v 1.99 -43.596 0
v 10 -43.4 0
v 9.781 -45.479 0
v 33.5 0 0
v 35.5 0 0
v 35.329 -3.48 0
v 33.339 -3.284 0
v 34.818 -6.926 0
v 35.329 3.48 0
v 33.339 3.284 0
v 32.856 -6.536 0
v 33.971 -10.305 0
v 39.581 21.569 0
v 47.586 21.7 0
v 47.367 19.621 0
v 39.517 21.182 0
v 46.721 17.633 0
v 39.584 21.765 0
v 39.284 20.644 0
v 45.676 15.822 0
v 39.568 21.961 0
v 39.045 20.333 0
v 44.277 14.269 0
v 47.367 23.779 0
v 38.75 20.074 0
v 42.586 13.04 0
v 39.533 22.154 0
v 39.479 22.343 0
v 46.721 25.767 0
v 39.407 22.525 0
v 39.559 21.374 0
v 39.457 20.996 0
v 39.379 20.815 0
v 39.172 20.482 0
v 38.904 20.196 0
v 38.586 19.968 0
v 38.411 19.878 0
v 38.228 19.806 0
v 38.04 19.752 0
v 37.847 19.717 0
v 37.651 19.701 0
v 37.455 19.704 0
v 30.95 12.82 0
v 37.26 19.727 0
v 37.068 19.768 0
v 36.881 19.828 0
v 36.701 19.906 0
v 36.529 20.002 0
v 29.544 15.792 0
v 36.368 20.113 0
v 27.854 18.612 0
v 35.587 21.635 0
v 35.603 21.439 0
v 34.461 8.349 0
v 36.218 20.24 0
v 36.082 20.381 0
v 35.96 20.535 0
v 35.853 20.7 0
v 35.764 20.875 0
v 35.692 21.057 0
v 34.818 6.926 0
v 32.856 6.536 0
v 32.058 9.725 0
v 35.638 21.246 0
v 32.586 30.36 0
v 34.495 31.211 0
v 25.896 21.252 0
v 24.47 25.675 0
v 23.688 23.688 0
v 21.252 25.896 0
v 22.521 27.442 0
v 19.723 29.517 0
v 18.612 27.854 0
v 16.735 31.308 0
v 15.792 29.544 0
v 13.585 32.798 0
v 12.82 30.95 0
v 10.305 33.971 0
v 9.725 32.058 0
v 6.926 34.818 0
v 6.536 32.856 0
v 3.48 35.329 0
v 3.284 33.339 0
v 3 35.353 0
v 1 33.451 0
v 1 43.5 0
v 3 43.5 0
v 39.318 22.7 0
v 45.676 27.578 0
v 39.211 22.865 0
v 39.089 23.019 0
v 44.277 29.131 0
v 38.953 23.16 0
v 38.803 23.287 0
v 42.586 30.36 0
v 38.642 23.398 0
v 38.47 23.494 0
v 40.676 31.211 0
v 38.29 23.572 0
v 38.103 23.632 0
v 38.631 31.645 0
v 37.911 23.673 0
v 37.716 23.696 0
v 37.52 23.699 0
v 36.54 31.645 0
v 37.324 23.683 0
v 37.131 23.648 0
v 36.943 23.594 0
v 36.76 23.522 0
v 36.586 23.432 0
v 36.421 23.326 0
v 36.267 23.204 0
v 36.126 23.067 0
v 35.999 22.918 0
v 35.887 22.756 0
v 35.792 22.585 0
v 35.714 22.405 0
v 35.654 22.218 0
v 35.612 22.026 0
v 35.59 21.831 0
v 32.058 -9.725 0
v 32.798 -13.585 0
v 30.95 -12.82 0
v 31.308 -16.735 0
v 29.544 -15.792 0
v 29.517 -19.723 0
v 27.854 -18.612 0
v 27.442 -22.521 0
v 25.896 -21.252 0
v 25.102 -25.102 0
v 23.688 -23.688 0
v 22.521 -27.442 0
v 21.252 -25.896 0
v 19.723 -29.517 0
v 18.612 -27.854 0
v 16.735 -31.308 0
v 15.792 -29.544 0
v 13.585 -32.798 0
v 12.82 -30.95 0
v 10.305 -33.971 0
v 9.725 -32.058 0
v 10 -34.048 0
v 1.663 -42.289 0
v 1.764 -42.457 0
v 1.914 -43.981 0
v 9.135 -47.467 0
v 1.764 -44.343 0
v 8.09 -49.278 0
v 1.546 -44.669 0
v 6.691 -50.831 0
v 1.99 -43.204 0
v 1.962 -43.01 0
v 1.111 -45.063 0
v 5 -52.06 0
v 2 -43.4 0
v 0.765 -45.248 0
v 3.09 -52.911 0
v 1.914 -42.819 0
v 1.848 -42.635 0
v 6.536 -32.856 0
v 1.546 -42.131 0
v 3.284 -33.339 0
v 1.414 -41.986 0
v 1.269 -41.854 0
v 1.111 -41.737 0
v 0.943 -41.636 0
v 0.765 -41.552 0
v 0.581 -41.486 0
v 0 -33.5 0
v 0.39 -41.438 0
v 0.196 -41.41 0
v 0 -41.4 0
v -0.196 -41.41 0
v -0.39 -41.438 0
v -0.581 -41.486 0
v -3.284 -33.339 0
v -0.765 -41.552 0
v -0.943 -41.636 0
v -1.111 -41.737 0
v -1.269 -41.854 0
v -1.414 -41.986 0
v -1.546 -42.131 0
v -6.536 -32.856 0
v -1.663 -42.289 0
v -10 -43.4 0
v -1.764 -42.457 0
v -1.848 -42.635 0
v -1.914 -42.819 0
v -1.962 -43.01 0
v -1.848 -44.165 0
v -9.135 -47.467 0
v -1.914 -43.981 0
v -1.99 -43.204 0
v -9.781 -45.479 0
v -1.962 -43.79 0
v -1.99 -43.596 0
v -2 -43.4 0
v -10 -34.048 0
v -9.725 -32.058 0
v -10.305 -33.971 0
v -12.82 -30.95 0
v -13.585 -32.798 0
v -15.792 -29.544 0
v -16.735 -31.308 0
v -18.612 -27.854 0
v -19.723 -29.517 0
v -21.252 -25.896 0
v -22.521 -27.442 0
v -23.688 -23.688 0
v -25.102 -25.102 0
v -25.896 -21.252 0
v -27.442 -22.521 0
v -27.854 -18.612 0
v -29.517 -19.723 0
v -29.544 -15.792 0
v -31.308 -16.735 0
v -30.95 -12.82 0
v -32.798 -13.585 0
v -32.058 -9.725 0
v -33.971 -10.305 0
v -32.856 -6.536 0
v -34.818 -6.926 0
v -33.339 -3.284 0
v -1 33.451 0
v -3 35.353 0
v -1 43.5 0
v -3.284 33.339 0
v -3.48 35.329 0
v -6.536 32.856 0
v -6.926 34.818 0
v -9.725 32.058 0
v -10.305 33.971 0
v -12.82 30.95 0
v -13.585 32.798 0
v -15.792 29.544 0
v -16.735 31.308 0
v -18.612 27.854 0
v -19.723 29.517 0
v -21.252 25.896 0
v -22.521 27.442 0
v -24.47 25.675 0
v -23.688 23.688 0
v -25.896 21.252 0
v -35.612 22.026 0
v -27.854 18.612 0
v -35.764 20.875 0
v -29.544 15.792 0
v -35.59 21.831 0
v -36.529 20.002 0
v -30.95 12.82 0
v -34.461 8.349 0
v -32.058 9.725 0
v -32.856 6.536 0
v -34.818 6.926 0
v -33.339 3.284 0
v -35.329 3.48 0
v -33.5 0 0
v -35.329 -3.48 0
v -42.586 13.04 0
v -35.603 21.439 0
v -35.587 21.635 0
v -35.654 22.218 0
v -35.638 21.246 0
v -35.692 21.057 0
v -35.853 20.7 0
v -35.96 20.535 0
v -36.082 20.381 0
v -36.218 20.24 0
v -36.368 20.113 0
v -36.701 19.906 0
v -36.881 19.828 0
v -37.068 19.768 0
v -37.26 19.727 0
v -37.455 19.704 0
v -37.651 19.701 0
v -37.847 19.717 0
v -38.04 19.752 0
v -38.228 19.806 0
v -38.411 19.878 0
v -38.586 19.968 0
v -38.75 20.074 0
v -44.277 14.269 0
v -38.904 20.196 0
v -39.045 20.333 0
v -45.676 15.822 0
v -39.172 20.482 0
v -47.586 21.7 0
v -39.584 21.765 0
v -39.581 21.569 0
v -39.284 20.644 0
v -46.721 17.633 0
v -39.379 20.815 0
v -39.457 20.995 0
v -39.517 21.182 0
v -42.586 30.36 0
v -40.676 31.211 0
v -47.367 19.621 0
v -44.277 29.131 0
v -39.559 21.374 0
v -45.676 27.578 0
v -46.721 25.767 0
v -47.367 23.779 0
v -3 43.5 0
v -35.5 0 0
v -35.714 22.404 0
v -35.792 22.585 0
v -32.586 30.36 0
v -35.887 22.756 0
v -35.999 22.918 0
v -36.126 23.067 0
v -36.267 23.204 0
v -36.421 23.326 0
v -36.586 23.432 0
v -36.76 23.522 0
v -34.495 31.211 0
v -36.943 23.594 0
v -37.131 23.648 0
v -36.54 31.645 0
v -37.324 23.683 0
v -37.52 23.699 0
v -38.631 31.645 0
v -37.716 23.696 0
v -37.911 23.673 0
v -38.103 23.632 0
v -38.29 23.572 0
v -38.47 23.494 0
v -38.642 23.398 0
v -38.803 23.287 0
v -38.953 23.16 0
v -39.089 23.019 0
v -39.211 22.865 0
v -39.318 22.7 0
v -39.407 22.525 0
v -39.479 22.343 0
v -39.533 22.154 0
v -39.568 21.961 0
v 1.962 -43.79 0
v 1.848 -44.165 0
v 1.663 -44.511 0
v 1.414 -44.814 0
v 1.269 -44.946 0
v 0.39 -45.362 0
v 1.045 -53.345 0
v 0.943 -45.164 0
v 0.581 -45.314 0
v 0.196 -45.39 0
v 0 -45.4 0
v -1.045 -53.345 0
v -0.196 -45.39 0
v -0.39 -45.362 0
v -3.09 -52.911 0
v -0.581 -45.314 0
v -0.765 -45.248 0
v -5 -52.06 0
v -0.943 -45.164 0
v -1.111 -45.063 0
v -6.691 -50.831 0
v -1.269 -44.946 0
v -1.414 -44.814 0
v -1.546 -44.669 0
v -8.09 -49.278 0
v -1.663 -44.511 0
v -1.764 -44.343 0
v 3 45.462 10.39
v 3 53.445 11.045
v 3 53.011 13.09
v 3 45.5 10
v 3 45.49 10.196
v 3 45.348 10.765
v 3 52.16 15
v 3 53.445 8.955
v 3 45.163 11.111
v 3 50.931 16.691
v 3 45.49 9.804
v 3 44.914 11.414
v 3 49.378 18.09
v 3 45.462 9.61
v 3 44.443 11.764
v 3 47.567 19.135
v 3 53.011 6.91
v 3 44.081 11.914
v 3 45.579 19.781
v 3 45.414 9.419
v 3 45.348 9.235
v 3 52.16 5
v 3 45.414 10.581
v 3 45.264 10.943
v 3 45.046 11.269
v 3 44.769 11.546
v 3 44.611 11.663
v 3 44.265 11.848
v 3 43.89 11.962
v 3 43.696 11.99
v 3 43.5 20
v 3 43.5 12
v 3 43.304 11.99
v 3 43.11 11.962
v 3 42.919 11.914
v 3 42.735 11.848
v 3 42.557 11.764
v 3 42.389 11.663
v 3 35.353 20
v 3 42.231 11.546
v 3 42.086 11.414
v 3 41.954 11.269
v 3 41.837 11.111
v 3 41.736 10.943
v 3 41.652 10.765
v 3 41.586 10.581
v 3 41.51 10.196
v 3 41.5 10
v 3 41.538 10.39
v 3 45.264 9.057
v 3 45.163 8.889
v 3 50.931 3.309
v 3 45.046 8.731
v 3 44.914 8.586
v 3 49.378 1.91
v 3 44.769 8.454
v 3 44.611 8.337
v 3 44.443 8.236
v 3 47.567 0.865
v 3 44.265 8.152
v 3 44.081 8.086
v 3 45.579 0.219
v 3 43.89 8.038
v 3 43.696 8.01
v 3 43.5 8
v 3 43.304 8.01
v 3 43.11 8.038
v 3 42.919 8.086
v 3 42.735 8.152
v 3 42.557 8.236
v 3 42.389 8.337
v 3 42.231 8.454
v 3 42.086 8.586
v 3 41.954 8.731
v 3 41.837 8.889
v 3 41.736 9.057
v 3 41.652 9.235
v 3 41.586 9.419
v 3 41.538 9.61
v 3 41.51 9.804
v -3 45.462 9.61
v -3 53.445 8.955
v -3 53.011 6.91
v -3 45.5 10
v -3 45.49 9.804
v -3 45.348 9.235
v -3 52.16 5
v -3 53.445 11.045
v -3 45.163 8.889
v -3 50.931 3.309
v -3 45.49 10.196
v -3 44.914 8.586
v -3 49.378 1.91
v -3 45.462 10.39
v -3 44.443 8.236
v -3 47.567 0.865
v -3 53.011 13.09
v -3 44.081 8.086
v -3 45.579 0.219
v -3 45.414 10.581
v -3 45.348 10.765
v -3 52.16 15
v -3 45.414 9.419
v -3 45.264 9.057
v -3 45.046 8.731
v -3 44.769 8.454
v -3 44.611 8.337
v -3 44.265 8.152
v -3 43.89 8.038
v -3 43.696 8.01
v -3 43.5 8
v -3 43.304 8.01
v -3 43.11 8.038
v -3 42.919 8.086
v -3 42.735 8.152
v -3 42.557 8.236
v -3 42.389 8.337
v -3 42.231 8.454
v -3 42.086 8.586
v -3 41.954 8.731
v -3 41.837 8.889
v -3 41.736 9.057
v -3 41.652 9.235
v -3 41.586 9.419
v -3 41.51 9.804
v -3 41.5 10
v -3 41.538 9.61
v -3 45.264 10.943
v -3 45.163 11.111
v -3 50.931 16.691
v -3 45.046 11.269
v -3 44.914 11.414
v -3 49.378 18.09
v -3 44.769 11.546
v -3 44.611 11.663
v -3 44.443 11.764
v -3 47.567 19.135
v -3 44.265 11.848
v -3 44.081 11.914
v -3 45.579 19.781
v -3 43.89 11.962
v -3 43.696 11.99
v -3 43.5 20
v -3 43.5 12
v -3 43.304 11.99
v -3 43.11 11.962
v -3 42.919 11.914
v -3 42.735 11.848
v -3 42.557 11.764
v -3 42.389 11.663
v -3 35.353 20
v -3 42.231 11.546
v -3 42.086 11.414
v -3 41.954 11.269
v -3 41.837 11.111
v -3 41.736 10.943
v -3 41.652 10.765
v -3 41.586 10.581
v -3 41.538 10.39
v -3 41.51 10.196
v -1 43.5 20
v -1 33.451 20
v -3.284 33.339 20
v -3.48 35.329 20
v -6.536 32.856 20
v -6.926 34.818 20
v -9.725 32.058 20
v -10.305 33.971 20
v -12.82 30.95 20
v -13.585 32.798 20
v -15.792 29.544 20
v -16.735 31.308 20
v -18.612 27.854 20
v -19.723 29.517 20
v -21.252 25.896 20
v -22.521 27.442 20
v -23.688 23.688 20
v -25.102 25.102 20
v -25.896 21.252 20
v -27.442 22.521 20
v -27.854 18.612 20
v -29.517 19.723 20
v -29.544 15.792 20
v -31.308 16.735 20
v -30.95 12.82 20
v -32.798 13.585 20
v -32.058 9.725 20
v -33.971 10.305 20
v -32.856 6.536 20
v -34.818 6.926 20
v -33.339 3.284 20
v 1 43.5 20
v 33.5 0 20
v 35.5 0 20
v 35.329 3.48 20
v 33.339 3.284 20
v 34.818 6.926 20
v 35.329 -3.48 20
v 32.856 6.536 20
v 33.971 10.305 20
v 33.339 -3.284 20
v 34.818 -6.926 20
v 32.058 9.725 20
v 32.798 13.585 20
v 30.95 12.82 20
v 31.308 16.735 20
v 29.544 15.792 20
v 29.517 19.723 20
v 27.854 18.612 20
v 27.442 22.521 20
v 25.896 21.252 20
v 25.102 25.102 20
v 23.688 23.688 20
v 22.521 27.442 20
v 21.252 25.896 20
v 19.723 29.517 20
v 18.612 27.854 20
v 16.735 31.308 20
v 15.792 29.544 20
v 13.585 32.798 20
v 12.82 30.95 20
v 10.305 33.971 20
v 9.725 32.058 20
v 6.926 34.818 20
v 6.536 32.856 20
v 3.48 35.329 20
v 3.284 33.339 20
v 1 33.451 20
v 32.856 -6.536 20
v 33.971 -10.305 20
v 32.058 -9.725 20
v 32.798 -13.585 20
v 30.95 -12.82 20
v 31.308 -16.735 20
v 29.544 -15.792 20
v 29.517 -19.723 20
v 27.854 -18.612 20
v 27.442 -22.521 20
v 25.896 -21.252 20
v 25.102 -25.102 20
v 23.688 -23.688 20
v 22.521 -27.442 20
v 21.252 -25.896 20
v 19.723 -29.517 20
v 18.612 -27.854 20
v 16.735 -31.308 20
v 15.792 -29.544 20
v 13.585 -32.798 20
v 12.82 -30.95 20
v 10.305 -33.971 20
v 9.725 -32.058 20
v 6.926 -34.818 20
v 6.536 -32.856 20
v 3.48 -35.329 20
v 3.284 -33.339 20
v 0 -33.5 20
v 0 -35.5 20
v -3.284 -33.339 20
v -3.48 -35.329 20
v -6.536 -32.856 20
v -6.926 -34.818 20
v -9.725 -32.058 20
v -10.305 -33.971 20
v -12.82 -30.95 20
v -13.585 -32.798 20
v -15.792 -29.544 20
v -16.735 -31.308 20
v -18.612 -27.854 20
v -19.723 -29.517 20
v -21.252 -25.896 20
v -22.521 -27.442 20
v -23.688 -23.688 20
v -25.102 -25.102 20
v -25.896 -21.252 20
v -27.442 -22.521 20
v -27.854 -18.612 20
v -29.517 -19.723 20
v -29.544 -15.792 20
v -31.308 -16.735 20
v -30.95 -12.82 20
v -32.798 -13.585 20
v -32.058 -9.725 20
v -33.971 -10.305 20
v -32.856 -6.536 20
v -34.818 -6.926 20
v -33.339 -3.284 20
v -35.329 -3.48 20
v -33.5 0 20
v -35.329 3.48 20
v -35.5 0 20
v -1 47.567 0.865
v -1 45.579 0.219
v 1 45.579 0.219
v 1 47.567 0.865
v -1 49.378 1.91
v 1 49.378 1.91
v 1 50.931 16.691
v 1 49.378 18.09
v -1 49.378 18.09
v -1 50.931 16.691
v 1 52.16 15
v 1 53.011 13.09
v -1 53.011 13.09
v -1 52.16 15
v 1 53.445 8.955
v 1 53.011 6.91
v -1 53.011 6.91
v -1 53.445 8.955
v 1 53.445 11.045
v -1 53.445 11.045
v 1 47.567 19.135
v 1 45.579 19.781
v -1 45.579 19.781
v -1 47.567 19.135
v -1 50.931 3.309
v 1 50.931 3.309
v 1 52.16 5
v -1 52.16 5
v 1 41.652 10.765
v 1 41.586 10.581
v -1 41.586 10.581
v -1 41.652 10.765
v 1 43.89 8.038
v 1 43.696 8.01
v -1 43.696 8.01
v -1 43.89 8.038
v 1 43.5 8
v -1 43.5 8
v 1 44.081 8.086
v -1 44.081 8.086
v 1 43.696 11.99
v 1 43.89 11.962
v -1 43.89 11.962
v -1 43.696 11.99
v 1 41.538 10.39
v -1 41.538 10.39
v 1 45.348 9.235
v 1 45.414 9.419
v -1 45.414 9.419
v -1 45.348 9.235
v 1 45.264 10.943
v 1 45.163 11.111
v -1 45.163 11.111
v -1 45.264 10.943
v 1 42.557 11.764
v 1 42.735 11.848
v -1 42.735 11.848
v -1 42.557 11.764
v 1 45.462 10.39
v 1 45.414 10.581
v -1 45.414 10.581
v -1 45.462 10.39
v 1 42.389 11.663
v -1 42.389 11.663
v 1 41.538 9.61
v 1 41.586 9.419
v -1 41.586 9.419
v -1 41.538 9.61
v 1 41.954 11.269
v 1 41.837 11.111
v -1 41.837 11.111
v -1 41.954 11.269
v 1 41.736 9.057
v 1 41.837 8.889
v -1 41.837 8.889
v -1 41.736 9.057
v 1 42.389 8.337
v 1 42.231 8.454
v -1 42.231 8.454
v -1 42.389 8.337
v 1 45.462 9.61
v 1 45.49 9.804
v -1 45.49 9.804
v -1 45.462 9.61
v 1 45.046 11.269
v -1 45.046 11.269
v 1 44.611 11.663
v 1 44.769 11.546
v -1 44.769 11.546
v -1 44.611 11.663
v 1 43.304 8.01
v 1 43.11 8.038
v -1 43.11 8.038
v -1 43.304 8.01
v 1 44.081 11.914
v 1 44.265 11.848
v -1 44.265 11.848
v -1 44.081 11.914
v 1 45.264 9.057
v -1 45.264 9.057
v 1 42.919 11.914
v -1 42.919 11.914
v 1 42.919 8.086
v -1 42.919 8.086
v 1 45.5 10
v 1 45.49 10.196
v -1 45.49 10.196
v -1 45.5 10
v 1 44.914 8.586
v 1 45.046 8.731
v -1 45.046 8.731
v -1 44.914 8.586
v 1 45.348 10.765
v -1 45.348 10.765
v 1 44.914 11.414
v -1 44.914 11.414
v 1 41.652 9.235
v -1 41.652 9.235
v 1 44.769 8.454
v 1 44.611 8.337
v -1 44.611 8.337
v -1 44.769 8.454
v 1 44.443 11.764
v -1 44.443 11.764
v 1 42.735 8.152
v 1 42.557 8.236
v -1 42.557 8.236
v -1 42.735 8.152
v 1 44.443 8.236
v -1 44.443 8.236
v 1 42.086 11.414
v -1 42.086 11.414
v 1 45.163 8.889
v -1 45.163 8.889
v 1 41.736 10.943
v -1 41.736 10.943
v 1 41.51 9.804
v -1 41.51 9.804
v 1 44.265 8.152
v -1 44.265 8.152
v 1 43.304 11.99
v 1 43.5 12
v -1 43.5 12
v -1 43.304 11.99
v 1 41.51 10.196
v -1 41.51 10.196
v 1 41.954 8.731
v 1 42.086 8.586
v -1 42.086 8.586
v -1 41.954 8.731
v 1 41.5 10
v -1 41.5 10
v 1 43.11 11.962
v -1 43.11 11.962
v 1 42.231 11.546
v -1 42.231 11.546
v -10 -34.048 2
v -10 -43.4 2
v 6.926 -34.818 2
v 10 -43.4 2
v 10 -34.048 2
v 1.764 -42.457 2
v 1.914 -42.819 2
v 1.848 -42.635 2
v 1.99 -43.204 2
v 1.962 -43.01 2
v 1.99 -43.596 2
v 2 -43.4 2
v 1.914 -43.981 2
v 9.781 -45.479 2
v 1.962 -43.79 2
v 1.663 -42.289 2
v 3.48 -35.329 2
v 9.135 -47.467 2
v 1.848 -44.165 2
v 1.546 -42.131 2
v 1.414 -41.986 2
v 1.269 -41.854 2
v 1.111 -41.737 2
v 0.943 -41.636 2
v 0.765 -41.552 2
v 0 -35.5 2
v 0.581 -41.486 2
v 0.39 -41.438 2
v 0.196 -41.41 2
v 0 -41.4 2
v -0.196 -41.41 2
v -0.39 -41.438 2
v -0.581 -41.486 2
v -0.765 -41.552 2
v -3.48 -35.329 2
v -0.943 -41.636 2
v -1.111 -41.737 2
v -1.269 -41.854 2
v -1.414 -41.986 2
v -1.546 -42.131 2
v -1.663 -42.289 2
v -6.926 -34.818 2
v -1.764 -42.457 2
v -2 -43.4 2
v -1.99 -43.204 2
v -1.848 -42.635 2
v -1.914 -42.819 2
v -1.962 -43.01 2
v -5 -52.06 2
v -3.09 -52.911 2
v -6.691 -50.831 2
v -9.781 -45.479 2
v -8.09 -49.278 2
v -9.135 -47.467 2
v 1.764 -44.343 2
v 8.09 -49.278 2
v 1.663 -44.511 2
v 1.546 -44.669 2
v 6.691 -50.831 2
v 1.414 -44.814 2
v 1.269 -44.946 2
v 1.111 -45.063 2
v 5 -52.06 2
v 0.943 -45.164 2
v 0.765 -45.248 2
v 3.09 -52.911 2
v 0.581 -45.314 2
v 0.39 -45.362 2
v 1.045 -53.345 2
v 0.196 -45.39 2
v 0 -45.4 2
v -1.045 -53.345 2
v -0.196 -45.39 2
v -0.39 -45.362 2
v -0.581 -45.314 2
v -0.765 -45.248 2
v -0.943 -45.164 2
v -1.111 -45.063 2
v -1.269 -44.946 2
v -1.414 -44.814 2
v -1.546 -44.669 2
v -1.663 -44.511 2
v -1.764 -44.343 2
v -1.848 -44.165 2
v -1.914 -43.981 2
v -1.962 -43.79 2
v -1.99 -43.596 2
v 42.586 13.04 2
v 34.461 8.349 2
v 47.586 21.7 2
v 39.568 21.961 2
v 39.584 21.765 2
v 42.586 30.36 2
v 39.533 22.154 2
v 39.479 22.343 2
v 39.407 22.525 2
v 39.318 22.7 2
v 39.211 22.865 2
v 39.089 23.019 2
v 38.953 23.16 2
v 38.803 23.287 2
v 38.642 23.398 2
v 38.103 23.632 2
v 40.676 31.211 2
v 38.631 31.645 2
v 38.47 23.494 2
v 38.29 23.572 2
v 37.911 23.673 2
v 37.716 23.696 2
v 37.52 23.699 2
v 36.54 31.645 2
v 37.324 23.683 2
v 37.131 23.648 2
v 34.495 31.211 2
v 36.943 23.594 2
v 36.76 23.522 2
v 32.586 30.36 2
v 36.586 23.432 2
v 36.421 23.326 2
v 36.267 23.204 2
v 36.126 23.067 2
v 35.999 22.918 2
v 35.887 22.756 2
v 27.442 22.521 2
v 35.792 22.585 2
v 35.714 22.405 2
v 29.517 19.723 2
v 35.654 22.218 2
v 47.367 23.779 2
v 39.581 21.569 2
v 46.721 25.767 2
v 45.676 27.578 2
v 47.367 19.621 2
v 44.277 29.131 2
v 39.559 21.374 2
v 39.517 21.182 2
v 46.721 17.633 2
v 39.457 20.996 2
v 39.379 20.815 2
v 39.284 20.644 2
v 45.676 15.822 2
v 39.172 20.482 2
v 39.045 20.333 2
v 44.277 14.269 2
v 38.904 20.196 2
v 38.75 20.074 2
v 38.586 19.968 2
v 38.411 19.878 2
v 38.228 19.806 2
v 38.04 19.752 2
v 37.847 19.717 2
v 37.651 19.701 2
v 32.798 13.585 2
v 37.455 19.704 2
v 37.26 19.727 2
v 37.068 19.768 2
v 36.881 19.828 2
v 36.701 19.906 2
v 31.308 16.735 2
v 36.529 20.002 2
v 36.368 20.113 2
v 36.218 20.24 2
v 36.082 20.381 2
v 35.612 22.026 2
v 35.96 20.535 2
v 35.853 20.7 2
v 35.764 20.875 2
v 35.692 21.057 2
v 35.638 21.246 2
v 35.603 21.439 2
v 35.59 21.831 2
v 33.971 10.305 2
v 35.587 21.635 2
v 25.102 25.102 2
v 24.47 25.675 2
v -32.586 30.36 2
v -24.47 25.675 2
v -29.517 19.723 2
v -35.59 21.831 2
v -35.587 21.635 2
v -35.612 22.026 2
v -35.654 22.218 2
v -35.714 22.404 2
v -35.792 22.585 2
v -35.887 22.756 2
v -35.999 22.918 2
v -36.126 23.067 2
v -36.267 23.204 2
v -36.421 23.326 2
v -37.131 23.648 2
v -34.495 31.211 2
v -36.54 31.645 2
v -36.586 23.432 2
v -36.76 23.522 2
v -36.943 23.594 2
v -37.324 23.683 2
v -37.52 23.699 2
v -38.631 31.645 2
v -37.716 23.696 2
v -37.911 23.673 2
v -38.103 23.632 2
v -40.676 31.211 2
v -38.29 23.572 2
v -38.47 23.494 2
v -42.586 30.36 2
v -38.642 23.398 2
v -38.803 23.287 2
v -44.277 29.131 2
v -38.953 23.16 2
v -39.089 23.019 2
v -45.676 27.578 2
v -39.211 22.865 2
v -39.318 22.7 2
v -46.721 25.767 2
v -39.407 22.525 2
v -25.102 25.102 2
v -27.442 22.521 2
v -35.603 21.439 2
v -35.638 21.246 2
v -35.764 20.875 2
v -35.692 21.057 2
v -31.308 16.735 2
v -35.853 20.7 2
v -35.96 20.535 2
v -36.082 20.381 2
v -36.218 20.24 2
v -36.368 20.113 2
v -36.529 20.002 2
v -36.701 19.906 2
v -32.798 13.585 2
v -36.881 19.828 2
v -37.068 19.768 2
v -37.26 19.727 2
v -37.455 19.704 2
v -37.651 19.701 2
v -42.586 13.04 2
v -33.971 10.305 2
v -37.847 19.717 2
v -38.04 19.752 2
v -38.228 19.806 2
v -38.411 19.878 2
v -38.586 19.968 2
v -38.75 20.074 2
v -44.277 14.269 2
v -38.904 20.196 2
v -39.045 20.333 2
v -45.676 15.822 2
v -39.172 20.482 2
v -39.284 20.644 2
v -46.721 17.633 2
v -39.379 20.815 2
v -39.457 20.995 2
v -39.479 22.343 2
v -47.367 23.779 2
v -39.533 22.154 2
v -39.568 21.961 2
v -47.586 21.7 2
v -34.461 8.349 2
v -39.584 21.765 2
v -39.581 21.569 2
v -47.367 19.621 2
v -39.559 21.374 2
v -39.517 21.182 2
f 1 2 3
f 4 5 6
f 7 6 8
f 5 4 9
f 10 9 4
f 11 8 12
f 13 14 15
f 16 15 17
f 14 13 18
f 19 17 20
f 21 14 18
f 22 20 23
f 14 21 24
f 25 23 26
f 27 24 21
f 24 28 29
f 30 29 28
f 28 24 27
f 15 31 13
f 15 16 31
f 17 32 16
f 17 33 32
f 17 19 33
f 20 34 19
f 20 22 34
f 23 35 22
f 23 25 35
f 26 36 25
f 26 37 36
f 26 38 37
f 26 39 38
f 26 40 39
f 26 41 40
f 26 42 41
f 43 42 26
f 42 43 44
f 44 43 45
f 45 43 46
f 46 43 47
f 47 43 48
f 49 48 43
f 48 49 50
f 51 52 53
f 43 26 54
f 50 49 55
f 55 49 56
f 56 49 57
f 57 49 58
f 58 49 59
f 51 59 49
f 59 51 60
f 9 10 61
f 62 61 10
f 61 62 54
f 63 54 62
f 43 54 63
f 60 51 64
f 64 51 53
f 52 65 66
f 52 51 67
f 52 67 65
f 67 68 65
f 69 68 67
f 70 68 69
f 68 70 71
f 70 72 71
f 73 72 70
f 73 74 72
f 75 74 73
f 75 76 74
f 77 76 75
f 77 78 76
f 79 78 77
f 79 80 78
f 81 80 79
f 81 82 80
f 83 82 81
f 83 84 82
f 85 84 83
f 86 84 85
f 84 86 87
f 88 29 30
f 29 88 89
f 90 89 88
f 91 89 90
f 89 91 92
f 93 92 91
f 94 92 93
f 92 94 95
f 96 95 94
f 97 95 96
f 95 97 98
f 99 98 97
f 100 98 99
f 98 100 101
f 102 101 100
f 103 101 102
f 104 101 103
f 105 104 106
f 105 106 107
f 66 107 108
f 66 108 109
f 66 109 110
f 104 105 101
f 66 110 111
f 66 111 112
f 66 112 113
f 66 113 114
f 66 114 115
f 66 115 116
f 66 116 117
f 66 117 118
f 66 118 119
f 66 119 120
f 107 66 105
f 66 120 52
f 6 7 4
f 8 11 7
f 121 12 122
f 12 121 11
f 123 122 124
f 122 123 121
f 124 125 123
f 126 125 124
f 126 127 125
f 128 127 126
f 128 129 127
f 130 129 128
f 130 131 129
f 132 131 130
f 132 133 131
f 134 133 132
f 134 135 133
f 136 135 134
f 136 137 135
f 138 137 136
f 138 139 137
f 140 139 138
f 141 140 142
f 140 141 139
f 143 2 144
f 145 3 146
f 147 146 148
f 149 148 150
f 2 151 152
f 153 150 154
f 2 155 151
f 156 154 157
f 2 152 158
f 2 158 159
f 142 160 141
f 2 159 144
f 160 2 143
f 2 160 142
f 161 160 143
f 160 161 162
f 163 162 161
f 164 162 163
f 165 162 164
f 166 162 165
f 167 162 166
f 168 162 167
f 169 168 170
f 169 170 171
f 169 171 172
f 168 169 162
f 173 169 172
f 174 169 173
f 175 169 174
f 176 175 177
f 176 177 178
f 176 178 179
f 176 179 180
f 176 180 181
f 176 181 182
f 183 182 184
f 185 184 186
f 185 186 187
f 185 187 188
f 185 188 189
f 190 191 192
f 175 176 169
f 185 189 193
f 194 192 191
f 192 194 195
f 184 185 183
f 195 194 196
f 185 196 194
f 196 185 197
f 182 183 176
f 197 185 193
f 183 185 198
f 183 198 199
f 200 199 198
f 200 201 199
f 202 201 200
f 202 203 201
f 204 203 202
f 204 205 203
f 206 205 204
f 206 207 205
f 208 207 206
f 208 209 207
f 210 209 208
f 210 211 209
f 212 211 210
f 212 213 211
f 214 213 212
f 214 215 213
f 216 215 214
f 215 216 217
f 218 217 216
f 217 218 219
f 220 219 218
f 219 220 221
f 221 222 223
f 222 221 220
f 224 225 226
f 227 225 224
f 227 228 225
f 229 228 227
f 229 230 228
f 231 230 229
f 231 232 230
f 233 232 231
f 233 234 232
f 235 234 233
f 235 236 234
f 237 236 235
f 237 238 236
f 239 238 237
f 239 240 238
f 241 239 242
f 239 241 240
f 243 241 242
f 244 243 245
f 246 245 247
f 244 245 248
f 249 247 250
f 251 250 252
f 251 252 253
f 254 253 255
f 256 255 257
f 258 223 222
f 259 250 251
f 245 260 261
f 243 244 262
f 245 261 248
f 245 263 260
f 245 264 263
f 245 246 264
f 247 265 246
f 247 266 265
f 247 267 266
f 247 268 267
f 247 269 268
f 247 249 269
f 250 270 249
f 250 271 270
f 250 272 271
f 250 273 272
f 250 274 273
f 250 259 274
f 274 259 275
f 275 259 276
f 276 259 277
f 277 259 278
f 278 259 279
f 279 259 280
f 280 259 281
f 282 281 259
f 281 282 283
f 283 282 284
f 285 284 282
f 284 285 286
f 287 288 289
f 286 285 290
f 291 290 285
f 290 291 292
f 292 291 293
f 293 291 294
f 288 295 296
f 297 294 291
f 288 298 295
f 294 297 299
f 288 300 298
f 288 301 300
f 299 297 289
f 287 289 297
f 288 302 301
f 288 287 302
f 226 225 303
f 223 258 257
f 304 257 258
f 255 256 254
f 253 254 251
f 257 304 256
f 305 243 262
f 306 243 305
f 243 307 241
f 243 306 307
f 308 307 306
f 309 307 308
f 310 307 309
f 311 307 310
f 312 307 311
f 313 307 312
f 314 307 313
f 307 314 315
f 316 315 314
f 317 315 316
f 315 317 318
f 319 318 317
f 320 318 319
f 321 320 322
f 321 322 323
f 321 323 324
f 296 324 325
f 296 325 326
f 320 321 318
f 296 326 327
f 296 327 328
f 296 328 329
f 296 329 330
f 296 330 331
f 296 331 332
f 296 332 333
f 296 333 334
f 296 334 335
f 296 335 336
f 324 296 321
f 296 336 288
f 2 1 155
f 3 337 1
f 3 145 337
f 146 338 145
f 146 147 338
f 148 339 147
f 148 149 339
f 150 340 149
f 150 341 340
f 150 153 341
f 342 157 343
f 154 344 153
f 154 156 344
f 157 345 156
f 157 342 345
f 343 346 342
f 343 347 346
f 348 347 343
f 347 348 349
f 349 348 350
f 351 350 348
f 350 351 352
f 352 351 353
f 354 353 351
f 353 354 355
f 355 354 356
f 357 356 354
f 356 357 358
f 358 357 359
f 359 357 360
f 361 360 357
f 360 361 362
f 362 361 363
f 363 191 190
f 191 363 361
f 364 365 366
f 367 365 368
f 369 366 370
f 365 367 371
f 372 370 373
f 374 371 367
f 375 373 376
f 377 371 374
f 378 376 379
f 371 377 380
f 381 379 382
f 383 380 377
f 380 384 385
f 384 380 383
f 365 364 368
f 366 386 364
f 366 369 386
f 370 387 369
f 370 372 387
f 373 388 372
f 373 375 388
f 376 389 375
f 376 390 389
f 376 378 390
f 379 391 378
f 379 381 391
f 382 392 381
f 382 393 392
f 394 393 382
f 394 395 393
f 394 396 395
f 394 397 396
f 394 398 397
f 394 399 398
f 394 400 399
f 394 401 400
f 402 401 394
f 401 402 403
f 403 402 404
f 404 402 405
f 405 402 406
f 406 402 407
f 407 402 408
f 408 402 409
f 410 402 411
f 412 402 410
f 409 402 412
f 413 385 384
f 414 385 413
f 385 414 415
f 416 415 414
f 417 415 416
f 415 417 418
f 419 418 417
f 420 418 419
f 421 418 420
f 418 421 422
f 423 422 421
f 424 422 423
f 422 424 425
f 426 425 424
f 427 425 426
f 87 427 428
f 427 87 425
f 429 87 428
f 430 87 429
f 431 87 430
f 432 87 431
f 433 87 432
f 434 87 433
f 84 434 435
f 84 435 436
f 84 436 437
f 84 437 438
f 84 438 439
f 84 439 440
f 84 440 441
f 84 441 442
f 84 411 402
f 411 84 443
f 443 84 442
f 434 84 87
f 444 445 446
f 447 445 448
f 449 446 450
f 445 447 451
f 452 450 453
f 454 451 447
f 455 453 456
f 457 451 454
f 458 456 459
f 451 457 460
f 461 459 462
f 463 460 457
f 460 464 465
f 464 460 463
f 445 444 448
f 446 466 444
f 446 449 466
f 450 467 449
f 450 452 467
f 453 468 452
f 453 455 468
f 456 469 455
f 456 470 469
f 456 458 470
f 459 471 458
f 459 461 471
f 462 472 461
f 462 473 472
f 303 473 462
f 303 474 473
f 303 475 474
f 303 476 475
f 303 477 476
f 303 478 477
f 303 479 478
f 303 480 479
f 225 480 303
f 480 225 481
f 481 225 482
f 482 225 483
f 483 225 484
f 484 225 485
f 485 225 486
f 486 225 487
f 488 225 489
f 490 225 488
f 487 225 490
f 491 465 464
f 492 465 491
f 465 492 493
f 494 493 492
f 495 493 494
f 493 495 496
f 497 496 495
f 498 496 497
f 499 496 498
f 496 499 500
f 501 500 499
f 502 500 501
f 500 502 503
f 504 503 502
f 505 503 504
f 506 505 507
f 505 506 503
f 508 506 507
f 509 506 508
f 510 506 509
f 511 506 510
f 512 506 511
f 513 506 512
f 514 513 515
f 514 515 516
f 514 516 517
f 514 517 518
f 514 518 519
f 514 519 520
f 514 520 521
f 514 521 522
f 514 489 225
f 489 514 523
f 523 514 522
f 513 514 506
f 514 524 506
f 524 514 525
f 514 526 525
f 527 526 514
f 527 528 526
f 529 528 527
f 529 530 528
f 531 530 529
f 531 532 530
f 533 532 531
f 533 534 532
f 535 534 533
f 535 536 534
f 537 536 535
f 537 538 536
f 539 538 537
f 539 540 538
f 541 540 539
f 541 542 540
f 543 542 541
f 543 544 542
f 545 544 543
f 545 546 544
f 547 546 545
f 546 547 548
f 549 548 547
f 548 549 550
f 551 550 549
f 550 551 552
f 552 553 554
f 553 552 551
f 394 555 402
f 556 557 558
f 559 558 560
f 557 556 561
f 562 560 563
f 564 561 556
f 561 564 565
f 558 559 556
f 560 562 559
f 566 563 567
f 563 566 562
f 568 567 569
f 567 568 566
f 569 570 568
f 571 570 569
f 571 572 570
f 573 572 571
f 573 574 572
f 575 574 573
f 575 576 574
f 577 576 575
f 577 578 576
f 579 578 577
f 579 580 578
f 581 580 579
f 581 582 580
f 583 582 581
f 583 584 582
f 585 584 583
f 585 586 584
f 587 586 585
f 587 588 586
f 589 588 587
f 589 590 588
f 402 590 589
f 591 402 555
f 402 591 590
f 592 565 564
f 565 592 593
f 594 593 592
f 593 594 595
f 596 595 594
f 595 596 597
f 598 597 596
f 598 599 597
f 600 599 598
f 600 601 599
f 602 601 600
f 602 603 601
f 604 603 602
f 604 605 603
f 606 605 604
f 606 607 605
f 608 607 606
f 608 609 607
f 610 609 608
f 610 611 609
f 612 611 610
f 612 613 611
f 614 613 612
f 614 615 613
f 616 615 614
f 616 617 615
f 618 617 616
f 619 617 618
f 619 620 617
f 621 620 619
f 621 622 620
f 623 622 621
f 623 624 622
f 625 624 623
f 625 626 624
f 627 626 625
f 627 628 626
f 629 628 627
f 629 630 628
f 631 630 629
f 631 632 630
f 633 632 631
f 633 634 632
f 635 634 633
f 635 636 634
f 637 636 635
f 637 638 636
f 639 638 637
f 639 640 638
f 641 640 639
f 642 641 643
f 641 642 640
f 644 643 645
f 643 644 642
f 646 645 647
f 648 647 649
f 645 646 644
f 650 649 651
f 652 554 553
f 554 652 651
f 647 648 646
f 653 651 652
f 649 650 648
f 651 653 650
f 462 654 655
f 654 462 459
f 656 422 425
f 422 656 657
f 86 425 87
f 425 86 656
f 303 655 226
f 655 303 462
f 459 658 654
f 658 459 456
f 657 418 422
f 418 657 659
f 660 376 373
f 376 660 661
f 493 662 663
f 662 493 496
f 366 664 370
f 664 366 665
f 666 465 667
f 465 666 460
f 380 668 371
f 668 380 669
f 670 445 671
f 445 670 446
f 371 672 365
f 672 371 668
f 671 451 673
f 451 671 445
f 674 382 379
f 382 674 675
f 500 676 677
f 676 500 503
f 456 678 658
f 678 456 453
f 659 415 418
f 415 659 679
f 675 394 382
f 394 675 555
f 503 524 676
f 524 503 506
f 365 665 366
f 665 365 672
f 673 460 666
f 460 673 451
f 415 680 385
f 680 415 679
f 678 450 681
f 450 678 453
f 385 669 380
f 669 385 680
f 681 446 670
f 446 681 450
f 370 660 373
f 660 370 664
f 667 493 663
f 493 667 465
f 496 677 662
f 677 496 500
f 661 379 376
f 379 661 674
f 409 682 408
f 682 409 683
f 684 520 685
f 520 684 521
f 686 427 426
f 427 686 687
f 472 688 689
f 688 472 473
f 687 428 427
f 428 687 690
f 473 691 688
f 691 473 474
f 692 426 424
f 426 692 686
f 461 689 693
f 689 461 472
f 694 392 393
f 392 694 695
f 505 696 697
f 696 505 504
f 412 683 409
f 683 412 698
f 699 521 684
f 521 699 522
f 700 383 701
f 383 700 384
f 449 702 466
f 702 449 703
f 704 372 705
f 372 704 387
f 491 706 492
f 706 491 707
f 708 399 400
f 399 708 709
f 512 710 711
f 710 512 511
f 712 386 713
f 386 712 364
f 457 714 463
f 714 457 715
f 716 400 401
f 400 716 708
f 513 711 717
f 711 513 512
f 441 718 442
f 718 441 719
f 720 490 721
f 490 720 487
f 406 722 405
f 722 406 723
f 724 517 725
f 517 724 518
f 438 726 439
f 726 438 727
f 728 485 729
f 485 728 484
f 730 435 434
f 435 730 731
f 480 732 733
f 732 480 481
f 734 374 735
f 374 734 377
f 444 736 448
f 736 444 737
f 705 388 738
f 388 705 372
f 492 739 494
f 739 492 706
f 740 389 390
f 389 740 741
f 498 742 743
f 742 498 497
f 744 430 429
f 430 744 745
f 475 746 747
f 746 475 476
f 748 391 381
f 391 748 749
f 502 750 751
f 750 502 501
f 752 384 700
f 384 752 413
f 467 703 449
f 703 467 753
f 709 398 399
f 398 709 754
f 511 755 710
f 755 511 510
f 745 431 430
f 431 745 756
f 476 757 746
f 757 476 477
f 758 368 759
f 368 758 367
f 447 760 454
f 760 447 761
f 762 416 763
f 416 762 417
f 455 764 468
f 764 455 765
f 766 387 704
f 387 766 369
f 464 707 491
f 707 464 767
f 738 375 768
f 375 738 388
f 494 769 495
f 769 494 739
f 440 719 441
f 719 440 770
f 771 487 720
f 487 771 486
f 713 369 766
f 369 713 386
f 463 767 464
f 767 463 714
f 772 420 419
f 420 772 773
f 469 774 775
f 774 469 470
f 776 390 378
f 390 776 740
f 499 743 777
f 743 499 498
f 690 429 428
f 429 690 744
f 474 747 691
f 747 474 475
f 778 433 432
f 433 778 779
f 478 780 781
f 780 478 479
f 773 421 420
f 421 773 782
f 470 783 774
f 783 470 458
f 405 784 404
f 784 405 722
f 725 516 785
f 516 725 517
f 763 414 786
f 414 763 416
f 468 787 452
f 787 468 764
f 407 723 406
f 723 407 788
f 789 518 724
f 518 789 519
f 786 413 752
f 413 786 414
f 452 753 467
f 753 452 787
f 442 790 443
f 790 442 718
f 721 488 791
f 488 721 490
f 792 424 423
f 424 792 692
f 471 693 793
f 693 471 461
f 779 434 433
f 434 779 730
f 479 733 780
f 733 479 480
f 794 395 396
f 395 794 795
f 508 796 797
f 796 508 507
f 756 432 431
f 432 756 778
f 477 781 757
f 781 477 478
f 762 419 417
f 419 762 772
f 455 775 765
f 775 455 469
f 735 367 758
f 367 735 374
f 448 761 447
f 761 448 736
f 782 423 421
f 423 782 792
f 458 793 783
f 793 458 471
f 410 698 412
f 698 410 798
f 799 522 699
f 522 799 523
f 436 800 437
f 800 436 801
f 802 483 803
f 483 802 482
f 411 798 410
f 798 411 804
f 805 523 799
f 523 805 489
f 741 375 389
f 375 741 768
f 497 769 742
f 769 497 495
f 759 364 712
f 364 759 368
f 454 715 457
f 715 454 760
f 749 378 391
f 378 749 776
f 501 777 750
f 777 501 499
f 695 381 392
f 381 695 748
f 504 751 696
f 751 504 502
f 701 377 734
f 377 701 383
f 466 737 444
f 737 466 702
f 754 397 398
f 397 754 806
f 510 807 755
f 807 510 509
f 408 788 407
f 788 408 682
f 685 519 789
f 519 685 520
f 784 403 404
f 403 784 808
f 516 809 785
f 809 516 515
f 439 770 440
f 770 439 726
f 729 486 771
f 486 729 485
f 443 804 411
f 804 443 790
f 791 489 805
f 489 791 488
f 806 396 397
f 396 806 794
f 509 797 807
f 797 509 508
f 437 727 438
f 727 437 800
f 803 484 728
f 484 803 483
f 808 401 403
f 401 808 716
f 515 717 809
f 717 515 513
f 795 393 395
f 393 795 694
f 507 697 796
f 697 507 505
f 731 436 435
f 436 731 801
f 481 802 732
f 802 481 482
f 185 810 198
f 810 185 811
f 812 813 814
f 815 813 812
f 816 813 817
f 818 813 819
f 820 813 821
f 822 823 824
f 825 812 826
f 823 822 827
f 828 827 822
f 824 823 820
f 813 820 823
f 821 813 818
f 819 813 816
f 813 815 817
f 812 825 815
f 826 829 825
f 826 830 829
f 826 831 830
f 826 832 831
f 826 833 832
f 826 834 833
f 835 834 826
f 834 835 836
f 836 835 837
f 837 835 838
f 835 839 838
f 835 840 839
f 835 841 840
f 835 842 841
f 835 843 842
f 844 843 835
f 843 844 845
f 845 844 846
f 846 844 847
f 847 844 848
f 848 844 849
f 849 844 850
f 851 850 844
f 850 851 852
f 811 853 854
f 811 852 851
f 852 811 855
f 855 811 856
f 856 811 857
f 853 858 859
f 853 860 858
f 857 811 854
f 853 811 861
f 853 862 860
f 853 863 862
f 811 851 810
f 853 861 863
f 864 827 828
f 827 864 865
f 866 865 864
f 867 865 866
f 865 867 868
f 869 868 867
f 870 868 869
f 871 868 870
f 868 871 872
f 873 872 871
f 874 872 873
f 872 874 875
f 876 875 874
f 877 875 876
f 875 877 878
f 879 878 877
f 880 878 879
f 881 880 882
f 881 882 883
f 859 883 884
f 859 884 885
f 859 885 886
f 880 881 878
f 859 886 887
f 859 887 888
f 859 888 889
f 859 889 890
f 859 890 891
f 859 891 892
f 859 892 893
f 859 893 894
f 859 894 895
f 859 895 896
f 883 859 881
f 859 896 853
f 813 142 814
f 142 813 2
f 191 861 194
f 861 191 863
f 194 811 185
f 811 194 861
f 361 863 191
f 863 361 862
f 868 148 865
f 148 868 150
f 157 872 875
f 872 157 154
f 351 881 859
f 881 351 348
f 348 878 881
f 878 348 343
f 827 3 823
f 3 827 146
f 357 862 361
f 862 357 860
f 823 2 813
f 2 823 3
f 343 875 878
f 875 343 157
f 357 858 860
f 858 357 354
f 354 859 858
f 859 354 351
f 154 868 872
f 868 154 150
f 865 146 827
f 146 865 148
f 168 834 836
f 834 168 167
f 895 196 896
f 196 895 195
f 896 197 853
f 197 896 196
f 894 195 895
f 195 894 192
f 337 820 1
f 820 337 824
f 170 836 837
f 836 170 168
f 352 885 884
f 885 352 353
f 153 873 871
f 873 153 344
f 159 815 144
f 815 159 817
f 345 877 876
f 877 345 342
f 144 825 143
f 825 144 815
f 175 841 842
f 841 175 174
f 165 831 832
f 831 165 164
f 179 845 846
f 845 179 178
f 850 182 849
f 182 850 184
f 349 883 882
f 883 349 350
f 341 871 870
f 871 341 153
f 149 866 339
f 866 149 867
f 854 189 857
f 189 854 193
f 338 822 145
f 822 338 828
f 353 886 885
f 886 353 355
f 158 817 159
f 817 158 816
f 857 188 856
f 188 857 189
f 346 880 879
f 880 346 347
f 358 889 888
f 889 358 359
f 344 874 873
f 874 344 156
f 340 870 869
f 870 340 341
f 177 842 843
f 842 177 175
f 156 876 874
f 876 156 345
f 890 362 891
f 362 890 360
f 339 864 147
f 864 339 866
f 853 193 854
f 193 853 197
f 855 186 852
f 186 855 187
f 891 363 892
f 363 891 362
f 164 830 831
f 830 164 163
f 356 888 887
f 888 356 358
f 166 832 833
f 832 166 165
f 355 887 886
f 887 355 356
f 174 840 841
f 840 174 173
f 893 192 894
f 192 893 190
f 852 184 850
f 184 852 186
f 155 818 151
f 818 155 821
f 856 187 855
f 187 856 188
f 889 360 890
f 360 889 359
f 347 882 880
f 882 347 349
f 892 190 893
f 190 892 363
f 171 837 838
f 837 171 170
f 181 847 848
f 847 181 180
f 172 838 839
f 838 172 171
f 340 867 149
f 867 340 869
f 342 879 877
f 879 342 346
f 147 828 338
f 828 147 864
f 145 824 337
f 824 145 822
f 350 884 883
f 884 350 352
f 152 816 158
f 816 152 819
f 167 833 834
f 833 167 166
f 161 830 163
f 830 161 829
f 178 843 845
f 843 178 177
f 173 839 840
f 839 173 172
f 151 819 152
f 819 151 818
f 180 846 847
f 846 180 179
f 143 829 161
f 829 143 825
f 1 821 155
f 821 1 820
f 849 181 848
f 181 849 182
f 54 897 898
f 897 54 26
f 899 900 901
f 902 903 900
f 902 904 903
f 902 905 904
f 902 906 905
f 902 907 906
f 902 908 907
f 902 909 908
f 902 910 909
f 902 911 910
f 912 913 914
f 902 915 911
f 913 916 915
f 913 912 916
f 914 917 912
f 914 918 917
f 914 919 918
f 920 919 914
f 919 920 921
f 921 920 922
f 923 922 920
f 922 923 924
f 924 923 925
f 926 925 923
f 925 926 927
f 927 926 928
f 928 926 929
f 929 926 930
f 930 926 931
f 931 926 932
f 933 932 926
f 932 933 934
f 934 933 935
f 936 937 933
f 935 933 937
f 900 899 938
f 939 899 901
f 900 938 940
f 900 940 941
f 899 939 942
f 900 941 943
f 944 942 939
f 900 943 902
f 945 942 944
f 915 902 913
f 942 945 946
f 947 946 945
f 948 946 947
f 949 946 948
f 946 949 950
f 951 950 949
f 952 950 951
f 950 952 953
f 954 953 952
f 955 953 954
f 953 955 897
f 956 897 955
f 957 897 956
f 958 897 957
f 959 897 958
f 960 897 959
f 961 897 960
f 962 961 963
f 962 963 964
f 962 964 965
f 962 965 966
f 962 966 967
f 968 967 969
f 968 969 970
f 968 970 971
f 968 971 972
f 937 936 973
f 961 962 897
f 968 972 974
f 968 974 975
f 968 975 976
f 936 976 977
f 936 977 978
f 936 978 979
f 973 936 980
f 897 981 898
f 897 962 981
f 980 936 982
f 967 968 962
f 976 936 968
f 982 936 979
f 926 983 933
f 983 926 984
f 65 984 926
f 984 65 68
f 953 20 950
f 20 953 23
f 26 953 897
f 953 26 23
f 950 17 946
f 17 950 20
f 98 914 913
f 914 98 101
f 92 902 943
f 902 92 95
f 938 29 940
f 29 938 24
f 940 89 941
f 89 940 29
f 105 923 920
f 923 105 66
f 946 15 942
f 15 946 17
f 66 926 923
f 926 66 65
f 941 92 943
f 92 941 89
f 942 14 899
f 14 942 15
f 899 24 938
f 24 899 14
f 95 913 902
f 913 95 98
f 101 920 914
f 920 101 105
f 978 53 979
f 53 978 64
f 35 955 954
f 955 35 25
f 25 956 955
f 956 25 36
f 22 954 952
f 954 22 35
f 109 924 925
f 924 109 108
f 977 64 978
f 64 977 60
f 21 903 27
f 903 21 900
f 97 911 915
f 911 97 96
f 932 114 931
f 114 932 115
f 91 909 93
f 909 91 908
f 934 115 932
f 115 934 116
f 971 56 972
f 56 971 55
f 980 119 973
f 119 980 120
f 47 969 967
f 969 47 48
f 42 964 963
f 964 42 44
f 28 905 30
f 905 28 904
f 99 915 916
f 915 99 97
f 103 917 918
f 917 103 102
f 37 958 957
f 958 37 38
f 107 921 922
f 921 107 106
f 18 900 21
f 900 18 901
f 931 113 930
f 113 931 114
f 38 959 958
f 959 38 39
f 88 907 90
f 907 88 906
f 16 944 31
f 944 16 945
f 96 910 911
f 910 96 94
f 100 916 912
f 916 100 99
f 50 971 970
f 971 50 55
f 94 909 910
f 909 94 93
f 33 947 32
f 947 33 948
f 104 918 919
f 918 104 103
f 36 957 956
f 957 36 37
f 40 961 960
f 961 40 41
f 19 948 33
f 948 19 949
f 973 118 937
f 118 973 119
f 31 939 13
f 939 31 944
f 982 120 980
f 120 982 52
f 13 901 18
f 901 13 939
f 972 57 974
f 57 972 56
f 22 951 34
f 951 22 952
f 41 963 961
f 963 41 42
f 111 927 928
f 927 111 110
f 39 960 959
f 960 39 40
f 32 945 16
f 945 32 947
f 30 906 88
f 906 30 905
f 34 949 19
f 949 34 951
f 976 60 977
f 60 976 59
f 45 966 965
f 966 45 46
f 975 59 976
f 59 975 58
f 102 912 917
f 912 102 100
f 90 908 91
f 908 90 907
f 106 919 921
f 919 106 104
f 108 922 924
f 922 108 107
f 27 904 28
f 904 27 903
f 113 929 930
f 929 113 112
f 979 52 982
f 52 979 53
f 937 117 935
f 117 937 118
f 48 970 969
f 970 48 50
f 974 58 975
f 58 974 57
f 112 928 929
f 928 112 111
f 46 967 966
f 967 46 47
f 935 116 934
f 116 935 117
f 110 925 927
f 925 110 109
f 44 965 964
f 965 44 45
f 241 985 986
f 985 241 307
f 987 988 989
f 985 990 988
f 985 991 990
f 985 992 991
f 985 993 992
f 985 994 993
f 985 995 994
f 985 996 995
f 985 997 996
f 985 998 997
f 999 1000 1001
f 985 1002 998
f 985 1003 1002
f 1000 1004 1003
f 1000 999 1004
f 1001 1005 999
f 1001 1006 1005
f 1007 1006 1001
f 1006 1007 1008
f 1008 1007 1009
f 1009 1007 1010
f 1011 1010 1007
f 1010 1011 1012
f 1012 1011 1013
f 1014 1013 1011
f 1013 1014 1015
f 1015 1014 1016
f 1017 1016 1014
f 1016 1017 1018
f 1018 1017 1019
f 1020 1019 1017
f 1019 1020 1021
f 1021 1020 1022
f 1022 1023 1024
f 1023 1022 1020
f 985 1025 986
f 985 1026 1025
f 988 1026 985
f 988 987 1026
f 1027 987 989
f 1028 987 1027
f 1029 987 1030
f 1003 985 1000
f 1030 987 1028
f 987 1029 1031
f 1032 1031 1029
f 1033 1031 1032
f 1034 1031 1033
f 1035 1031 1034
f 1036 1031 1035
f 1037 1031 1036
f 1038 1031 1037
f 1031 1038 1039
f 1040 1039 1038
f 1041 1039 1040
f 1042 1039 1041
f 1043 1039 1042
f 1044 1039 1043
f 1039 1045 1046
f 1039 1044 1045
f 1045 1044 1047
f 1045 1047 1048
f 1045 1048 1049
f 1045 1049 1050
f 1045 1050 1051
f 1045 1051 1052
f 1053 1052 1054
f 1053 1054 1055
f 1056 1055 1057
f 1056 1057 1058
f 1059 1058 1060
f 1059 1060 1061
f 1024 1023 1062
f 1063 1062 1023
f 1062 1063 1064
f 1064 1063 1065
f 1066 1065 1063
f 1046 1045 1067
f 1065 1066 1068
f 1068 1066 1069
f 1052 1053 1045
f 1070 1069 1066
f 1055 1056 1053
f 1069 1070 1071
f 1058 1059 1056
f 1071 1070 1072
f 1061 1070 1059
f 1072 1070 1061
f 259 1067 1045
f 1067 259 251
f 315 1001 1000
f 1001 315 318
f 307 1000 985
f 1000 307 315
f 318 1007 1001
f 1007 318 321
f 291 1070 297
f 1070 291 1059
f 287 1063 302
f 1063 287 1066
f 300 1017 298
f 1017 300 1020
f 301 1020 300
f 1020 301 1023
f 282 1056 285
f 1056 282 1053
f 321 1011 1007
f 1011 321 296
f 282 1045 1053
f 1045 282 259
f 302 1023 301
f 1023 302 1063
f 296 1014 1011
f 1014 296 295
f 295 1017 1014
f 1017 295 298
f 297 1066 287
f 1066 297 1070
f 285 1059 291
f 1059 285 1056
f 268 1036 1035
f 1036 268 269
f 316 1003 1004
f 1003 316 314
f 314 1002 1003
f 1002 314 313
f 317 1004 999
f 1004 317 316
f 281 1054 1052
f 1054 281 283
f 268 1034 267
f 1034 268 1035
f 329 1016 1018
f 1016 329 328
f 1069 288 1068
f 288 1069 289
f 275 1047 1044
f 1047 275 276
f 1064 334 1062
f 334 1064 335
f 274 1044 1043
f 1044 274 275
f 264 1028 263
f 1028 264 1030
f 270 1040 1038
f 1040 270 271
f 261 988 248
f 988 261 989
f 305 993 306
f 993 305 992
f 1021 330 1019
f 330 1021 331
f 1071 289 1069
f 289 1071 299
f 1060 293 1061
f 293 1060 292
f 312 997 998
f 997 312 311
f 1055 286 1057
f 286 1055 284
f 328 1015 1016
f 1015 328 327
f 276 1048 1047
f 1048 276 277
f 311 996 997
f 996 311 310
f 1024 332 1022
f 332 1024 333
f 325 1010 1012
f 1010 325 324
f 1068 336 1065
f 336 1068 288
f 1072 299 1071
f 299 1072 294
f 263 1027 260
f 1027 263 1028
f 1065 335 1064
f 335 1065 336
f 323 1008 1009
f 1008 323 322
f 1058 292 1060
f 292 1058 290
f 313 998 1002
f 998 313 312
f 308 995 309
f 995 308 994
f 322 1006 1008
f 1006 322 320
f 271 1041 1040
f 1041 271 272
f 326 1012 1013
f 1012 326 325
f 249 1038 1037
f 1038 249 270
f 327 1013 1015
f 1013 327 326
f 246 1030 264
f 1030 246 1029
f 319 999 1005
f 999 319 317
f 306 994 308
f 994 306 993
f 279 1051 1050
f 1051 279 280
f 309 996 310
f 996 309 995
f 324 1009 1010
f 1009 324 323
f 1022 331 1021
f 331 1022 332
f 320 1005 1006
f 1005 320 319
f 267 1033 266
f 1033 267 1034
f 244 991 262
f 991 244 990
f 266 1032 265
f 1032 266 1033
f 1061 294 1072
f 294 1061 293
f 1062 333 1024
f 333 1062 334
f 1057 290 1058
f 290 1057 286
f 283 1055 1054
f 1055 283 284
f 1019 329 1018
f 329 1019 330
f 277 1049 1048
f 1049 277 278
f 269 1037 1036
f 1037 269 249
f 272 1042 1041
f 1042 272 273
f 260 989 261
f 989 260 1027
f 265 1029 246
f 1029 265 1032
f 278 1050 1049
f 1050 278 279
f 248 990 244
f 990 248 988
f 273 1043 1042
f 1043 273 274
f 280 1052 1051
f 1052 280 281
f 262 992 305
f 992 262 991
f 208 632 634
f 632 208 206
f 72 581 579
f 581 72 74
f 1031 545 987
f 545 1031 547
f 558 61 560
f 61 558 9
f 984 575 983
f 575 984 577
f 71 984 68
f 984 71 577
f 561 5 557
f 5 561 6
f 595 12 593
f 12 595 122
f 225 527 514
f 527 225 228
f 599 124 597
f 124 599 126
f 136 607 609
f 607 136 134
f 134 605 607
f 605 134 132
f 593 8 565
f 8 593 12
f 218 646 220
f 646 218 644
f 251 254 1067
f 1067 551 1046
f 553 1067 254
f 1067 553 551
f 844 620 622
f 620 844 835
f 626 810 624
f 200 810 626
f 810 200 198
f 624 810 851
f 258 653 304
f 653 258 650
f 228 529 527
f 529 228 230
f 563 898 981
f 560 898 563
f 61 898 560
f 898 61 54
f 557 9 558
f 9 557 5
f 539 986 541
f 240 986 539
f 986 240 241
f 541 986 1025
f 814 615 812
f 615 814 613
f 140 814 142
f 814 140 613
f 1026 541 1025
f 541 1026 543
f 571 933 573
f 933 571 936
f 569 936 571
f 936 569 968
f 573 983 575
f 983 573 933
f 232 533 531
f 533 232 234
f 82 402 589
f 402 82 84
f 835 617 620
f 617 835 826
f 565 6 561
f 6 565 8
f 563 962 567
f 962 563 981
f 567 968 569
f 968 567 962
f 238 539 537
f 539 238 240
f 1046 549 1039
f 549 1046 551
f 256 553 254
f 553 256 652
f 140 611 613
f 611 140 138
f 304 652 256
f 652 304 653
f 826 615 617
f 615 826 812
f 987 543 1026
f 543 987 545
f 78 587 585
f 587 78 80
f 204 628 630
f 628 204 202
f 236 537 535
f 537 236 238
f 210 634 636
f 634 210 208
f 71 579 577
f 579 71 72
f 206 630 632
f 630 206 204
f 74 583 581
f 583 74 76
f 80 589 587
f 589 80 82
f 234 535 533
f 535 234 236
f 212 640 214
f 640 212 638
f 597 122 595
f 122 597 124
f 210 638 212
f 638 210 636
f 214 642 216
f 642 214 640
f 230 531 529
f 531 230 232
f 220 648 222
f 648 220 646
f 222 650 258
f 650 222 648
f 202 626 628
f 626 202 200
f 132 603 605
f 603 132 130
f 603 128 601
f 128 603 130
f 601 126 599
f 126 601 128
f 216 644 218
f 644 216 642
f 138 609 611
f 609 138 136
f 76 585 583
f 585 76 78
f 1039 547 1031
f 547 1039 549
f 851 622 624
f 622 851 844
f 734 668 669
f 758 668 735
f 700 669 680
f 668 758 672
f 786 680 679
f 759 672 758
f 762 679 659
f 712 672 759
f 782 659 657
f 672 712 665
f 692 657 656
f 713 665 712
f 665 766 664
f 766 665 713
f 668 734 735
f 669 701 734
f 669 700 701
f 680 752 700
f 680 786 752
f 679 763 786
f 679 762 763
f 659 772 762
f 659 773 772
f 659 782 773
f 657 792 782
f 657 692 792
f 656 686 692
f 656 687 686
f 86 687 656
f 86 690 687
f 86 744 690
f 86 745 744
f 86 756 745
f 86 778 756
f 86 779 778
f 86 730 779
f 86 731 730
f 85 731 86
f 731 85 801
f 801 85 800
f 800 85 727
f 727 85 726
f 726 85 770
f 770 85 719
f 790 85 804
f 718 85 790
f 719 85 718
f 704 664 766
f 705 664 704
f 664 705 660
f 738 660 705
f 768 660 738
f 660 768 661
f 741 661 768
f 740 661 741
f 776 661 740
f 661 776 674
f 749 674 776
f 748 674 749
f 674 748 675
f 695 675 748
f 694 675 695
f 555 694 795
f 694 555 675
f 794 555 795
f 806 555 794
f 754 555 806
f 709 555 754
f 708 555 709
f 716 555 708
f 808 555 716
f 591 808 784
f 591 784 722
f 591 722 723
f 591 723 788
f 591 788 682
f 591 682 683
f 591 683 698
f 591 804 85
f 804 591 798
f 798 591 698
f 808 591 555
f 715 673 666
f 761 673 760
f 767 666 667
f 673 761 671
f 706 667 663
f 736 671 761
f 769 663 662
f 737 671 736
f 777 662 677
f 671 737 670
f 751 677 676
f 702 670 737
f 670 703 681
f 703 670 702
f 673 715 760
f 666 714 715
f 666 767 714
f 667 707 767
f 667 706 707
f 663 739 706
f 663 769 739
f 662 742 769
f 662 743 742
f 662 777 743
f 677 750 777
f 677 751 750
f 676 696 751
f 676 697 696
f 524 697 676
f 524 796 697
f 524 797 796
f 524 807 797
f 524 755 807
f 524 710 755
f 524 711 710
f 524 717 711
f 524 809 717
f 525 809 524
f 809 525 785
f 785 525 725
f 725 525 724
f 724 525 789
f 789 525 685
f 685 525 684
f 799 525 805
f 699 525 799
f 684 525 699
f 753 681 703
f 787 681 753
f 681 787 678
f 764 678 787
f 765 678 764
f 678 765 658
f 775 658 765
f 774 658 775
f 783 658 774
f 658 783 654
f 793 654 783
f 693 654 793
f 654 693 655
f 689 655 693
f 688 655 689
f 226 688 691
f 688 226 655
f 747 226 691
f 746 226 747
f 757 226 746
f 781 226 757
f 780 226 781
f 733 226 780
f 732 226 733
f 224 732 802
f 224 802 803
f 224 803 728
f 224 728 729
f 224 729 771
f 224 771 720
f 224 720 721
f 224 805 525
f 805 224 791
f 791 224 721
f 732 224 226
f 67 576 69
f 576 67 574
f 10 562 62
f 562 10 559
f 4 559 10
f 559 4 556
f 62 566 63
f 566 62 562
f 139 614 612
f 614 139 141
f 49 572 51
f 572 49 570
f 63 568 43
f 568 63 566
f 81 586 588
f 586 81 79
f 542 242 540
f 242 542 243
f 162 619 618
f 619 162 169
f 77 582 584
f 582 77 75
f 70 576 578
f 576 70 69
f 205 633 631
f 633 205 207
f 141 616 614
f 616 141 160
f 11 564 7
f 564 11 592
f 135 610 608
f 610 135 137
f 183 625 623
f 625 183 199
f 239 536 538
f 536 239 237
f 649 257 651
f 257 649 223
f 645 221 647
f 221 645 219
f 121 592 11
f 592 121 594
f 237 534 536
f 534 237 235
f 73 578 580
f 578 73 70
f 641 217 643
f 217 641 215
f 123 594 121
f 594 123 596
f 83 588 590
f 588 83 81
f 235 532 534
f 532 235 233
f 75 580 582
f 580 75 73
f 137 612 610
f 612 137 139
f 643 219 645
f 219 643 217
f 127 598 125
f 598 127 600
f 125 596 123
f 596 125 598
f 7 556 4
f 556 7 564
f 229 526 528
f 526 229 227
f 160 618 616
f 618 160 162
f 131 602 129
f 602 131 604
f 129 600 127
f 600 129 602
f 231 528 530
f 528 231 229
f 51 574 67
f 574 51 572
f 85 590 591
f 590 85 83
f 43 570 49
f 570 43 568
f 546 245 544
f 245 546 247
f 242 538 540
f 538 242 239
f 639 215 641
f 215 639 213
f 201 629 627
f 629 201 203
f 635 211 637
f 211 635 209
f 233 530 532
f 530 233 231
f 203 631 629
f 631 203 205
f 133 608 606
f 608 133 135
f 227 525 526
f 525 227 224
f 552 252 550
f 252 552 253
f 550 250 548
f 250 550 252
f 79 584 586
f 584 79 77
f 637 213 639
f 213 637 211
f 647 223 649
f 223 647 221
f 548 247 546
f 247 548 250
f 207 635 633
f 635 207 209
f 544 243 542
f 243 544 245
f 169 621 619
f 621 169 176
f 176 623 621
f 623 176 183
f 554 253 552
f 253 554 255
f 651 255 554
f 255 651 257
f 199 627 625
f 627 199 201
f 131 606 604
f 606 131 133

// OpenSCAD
// make this the same as your capacitors diameter
innerDiameter = 67;

// configure the belt
beltHeight = 20;
beltThickness = 2;

// configure the latch
totalLatchThickness = 3 * beltThickness;

// configure feet
numOfFeet = 3;
feetAngleOffset = 0;

// diameter for screw holes in feet
screwHoleDiameter = 4;

// number of segments for cylinders
globalFn = 64;

difference() {
    union() {
        // outer body
        beltOuter();

        // latch to clamp capacitor
        beltLatch(totalLatchThickness, beltHeight);

        // add feet
        feet();
    }

    // remove inside space for capacitor
    beltInner();

    // subtract a larger version of the latch
    // to split the latch block and belt into two pieces
    translate([0, -3, -3]) beltLatch(beltThickness, beltHeight + 6);
}

module beltOuter() {
    // outer diameter
    cylinder(d=innerDiameter + 2*beltThickness, h=beltHeight, $fn=globalFn);
}

module beltInner() {
    // subtract inside diameter
    cylinder(d=innerDiameter, h=beltHeight, $fn=globalFn);
}

module beltLatch(thickness, size) {
    // latch to clamp capacitor
    translate([0, innerDiameter/2 + size/2, size/2]) {
        rotate([0, 90, 0]) {
            latch(thickness, size);
        }
    }
}

module feet() {
    for (i = [1:numOfFeet]) {
        angle = i * 360/numOfFeet + 60 + feetAngleOffset;
        foot(angle);
    }
}

module foot(angle) {
    rotate([0, 0, angle]) {
        translate([0, innerDiameter/2 + beltHeight/2 - 0.1, beltThickness/2]) {
            latch(beltThickness, beltHeight);
        }
    }
}

module latch(thickness, size) {
    translate([-size/2, -size/2, -thickness/2]) {
        difference() {
            // latch body
            union() {
                cube([size, size/2, thickness]);
                translate([size/2, size/2, 0]) {
                    cylinder(d=size, h=thickness);
                }
            }

            // screwhole in latch
            translate([size/2, size/2, -thickness/2]) {
                cylinder(d=screwHoleDiameter, h=thickness*2, $fn=globalFn);
            }
        }
    }
}
